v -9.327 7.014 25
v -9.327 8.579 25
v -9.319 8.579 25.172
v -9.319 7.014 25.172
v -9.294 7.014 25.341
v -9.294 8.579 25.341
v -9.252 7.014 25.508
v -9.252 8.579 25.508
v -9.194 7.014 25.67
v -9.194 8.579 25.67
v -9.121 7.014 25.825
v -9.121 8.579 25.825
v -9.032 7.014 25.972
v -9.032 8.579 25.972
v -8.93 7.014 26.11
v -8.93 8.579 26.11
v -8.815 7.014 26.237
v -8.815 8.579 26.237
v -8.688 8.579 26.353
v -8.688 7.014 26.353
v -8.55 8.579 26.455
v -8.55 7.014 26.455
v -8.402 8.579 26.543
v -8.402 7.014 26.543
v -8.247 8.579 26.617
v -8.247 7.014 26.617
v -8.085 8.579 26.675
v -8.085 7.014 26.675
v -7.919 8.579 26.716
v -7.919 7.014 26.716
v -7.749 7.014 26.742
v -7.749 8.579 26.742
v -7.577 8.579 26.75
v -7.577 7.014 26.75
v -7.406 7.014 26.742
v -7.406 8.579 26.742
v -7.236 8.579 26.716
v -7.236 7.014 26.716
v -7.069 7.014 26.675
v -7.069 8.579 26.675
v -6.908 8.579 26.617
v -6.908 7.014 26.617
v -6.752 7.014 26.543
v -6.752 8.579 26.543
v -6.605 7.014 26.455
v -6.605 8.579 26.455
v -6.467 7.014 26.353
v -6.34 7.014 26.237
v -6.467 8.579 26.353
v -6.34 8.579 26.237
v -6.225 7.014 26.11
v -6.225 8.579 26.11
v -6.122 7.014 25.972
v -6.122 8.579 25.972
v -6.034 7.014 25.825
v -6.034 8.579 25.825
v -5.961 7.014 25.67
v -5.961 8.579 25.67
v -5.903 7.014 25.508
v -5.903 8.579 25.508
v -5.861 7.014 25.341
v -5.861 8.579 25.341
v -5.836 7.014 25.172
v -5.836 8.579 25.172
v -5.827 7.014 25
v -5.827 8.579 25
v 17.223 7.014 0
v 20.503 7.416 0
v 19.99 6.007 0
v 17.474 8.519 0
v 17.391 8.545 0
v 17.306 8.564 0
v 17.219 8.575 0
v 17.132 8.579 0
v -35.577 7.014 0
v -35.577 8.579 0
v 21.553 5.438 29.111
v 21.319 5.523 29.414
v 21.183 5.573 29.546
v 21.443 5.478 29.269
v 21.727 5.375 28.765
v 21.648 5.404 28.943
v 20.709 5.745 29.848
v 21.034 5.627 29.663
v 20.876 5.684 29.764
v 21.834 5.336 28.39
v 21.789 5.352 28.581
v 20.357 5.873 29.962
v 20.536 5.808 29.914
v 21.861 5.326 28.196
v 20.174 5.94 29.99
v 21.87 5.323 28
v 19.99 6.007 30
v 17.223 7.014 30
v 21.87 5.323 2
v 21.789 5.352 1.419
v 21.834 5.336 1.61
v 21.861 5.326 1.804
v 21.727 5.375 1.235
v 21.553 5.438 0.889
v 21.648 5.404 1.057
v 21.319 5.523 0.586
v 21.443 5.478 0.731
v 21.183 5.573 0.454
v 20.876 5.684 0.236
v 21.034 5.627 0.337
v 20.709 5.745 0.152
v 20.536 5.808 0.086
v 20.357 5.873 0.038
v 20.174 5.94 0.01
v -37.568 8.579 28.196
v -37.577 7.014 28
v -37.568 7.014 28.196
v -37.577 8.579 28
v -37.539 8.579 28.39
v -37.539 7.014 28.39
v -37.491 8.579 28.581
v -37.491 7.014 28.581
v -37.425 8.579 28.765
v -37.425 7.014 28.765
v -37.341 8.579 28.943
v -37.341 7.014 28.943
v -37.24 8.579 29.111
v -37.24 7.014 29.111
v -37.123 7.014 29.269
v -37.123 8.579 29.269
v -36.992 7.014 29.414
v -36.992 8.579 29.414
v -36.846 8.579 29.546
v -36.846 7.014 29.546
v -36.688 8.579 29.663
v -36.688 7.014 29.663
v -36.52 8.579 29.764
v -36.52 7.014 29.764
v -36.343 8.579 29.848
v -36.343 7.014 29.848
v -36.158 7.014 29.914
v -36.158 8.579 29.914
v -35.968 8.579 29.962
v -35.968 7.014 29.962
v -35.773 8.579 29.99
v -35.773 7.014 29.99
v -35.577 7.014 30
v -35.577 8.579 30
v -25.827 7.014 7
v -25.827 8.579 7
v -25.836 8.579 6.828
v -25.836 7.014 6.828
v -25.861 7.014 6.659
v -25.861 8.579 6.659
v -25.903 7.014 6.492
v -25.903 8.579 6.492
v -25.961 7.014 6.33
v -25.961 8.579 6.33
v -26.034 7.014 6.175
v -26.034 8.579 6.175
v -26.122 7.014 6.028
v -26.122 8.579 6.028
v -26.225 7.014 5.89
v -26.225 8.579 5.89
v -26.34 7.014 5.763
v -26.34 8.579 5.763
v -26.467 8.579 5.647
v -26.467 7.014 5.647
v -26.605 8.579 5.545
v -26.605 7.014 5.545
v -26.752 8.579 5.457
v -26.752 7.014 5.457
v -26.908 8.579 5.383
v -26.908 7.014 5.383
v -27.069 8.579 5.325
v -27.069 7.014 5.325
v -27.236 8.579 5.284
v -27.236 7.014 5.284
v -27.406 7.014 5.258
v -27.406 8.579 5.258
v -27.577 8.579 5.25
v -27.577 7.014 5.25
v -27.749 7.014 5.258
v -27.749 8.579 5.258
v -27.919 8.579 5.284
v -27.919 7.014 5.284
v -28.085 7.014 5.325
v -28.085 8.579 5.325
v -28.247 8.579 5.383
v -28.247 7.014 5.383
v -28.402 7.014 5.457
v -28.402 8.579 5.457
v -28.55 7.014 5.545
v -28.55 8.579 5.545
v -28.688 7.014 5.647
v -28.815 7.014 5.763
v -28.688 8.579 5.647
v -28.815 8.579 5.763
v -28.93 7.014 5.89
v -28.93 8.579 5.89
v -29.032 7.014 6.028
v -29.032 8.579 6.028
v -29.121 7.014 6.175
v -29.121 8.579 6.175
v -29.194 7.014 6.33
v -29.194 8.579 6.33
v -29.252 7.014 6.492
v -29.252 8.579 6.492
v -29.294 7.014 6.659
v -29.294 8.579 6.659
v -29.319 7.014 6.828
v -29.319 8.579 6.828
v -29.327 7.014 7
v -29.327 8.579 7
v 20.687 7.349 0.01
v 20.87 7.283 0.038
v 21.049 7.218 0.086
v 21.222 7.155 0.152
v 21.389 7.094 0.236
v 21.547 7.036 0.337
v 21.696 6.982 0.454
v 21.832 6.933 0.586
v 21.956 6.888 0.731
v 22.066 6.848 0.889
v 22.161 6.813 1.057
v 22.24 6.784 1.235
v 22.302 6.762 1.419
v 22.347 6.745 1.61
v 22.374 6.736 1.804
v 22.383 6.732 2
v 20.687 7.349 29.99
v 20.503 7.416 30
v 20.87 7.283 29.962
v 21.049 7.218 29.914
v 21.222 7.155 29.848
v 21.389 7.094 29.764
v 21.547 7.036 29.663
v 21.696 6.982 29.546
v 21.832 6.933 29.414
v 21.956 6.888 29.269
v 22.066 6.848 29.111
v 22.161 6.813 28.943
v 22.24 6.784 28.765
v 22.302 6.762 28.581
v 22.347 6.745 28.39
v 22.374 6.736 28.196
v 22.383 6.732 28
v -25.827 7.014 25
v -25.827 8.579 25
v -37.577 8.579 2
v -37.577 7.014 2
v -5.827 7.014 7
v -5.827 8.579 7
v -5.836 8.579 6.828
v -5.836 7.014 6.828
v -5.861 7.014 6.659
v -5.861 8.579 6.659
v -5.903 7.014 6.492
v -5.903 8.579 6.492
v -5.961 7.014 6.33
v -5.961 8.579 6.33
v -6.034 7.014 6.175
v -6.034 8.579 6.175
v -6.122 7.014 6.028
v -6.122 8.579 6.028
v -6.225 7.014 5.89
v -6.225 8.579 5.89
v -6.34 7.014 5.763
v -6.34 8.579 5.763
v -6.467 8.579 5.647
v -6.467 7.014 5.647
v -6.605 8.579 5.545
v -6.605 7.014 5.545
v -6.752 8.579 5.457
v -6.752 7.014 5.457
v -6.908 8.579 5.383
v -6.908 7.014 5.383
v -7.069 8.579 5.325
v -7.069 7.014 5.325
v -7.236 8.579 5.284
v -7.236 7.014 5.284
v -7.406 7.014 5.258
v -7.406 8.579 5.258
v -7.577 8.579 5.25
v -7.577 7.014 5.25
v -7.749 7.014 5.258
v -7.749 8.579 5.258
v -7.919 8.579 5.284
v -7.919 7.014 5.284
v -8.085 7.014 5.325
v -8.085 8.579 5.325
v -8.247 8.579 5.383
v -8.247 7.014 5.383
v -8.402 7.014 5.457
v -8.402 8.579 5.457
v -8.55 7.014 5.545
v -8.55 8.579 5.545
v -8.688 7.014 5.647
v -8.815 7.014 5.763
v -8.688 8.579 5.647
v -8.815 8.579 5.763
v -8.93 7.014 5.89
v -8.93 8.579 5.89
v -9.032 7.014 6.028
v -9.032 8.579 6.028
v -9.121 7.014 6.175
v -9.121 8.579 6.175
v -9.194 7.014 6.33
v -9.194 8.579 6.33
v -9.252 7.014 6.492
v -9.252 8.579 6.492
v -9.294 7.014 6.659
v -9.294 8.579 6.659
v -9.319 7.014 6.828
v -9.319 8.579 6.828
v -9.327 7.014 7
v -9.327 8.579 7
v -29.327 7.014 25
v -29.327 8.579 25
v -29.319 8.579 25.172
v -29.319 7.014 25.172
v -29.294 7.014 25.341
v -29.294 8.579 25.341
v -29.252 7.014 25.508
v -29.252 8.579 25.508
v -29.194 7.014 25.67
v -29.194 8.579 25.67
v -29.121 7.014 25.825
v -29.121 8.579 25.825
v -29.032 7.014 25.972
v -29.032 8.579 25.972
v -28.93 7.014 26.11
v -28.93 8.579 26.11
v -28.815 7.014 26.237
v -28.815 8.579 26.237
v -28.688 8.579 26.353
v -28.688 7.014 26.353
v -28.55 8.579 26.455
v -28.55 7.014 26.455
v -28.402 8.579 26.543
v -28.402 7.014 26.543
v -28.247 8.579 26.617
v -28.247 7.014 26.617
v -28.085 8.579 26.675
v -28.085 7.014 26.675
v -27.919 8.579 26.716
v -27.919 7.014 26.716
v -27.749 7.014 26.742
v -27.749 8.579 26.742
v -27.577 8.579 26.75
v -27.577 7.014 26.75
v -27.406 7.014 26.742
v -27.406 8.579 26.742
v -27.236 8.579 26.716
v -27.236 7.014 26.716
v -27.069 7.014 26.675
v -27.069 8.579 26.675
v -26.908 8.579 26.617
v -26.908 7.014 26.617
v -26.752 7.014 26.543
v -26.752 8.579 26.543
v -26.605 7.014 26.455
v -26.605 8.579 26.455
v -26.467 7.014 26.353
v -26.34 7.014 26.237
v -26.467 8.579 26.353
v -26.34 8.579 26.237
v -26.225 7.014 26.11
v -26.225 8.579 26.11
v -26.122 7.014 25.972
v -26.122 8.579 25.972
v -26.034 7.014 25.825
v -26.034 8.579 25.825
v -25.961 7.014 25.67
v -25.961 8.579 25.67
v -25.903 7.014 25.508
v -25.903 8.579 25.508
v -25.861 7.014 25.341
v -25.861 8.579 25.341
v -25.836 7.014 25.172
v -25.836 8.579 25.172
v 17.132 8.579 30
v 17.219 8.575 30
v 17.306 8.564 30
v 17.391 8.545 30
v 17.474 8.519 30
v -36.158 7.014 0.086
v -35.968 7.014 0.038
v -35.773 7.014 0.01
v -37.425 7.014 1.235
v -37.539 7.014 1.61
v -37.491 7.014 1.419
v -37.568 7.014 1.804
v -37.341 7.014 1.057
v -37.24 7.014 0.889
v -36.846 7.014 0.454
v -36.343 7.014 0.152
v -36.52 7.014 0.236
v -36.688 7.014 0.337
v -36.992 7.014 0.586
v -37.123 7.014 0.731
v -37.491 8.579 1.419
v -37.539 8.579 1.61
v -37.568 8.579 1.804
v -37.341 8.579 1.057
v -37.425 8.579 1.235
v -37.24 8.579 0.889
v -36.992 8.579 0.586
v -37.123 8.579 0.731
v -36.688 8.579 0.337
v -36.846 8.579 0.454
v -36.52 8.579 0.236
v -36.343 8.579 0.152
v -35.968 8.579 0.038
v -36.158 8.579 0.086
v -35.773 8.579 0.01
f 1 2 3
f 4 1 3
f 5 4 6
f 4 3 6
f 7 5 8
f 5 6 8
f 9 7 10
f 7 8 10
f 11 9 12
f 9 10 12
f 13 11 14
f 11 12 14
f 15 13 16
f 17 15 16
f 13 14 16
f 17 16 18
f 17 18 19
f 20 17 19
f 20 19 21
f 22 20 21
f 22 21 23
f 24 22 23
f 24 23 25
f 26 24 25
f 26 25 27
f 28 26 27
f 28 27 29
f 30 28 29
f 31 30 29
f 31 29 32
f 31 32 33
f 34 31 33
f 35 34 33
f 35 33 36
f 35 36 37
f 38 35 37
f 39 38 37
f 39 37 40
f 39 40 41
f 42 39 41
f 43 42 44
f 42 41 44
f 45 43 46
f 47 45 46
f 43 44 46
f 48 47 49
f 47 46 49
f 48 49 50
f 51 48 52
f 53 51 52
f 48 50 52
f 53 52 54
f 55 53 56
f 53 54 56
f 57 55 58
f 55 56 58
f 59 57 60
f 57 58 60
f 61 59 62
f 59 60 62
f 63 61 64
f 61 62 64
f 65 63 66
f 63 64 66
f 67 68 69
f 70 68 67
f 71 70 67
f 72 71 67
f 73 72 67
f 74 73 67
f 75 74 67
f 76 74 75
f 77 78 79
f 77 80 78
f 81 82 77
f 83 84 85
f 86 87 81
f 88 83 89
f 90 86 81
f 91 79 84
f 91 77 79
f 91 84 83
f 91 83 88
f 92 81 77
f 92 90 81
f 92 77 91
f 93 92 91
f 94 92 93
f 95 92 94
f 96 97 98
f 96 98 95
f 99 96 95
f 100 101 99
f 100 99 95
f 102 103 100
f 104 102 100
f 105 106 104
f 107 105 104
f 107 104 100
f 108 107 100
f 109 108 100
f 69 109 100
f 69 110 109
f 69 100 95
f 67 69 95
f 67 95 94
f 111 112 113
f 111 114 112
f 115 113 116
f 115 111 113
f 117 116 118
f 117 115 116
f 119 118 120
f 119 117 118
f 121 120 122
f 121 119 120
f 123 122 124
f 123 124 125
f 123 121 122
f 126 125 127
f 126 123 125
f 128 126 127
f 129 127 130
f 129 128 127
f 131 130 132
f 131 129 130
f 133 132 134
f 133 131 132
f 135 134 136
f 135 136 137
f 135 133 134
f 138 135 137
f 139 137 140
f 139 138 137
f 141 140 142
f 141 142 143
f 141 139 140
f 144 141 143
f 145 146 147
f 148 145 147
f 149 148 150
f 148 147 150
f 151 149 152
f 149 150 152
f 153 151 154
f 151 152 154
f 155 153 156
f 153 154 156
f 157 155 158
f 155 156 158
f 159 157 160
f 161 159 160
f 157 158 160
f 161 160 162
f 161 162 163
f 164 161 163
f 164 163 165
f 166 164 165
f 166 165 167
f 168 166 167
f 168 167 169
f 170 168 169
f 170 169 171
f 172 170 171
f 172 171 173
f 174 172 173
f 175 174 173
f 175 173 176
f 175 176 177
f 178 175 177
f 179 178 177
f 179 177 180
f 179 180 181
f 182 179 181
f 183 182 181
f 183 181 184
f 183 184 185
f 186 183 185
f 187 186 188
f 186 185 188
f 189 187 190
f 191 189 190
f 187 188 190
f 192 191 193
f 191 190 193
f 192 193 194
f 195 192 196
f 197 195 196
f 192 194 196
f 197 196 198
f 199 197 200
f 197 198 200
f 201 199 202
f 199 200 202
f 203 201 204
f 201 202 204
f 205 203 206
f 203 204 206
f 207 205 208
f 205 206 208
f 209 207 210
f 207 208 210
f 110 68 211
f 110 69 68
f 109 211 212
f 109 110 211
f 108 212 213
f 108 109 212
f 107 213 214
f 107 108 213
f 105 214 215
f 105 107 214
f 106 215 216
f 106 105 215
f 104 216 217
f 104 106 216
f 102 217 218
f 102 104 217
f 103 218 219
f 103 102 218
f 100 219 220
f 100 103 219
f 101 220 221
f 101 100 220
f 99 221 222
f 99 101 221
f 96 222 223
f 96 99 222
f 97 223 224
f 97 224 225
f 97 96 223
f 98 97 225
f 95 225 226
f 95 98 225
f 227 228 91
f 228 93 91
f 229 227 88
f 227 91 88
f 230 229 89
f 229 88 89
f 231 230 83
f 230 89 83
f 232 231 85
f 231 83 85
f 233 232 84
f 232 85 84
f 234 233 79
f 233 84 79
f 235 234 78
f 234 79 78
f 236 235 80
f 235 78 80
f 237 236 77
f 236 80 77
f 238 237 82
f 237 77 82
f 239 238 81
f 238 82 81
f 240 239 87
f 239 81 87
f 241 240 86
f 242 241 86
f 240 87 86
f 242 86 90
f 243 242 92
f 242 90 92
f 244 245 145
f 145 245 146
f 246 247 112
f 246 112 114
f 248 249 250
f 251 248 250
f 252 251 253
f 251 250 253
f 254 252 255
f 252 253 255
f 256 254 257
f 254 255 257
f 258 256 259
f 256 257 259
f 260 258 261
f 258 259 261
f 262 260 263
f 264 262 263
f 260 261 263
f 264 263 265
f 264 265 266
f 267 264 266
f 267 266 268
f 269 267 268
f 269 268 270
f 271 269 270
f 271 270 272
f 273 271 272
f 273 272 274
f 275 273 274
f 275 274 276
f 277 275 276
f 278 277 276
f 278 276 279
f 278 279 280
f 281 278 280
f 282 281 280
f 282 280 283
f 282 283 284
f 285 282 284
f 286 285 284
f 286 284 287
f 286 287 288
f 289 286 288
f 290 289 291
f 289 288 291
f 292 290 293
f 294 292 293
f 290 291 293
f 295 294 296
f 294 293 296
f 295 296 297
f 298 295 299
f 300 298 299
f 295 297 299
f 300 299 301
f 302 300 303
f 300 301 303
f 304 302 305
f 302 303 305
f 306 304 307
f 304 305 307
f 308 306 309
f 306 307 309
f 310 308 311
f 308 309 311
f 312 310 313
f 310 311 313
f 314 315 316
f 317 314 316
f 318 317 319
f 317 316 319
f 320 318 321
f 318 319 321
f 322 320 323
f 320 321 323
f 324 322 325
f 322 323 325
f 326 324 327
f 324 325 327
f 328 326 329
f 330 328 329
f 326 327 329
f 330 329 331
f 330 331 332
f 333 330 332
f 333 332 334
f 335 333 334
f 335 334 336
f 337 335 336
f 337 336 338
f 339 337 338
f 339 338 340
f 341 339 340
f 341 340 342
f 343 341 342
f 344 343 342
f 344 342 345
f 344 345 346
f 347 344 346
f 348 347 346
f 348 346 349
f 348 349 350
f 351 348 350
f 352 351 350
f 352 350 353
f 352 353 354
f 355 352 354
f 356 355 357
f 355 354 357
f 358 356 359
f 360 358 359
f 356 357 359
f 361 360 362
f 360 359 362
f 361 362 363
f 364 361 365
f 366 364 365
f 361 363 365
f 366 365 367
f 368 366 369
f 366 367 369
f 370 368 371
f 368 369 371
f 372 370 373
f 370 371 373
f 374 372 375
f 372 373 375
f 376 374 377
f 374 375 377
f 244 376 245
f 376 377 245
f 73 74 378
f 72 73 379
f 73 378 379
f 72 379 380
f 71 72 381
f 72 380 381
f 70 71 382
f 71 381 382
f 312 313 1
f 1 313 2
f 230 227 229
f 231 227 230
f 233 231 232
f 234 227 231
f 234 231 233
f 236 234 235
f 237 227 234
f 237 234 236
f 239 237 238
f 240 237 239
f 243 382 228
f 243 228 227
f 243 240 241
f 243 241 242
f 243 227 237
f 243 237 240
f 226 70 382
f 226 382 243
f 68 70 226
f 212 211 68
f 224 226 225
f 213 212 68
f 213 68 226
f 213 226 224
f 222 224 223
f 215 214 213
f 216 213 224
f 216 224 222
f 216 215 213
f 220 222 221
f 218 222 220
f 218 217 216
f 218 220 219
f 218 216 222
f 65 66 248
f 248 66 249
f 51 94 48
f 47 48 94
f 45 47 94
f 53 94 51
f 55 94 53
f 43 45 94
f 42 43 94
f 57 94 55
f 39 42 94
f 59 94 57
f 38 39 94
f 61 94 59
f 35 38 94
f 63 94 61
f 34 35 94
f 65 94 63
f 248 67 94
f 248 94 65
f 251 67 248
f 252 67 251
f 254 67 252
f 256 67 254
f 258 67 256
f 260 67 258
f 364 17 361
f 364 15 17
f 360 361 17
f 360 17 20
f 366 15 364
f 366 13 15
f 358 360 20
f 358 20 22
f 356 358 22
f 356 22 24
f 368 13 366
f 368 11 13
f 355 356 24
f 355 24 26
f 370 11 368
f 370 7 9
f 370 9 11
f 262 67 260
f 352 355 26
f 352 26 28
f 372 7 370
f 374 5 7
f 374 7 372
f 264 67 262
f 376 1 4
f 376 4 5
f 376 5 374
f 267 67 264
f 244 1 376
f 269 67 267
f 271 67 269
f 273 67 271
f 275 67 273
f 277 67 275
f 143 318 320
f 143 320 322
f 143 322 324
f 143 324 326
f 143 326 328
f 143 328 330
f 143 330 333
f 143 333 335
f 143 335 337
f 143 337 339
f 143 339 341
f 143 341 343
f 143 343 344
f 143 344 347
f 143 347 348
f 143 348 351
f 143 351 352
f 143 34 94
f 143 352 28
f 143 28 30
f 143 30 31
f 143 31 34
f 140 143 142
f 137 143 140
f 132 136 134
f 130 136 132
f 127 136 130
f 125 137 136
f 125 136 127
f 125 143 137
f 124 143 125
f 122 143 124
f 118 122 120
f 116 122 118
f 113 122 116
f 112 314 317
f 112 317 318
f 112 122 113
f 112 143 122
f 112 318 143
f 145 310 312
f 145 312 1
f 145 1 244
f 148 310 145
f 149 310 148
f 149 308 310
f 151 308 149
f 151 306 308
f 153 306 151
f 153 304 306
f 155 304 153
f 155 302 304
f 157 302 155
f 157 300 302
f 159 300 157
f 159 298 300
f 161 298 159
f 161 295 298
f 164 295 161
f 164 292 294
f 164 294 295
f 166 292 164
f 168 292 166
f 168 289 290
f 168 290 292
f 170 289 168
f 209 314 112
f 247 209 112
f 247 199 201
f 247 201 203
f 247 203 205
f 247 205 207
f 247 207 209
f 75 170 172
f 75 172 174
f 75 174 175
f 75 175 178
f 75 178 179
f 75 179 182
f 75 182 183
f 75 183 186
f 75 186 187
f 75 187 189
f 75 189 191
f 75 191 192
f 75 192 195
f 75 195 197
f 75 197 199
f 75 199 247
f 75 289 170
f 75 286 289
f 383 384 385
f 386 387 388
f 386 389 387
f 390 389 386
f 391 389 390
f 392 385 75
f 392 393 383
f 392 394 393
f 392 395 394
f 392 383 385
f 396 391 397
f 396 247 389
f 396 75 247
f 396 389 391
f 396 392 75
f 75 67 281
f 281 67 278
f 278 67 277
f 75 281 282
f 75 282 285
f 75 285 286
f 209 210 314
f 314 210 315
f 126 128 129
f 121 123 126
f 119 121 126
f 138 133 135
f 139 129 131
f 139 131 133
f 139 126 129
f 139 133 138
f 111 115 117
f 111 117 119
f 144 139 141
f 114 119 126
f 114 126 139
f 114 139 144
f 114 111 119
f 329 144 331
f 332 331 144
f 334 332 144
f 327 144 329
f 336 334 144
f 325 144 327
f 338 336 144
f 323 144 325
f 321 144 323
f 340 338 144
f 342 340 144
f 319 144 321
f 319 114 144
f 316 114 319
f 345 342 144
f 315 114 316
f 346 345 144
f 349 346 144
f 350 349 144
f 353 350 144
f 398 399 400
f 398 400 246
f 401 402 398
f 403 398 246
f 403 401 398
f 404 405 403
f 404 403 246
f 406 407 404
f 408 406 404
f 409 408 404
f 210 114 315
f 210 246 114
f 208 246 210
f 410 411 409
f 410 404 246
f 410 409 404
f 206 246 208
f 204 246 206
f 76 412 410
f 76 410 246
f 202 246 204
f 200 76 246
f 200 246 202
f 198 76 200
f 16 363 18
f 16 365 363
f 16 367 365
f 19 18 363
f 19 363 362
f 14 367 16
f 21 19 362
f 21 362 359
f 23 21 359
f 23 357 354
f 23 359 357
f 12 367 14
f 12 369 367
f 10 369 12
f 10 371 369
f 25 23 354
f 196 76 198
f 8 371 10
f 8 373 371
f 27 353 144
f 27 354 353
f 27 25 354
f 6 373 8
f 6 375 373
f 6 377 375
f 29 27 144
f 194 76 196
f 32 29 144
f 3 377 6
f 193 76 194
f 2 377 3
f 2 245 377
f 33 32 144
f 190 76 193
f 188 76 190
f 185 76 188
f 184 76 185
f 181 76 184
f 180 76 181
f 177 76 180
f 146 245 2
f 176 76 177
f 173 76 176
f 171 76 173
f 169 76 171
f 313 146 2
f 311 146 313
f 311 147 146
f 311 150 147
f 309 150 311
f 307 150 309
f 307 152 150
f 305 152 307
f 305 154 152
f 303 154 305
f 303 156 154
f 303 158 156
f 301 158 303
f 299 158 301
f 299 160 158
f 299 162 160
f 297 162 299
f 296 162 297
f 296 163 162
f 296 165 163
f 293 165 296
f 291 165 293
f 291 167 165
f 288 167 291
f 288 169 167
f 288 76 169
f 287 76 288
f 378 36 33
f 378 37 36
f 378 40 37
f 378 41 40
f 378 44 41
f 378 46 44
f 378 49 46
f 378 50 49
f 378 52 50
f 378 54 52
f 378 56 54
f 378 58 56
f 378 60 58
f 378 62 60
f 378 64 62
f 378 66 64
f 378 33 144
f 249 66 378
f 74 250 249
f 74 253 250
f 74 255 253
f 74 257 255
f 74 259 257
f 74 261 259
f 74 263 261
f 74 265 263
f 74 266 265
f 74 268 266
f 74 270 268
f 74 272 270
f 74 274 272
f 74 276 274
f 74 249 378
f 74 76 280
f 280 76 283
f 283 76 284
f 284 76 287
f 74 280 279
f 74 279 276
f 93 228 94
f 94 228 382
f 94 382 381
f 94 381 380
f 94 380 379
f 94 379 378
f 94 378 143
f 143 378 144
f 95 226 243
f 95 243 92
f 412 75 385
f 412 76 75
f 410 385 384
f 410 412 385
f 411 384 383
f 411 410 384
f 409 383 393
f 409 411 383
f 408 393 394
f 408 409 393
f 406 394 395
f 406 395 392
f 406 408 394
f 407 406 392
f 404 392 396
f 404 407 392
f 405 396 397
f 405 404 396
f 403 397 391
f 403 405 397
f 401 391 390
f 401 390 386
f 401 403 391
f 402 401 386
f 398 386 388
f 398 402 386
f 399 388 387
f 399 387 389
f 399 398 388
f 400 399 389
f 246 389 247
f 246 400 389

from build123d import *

# Parameters (mm, degrees)
BOSS_EXTRUDE1_DEPTH = 30
FILLET1_R           = 1
FILLET2_R           = 2
CUT_EXTRUDE1_DEPTH  = 4.256447705


with BuildPart() as part:
    # Sketch1 → Boss-Extrude1 (new body)
    with BuildSketch(Plane.XY):
        Polygon((-37.577345781, 8.579229267), (17.308314067, 8.579229267), (22.382654219, 6.732320493), (21.869624004, 5.322781562), (17.222654219, 7.014140243), (-37.577345781, 7.014140243), align=None)
    extrude(amount=BOSS_EXTRUDE1_DEPTH)

    # Fillet1
    fillet1_edges = [part.edges().sort_by_distance(p)[0] for p in [
        (17.308314067, 8.579229267, 15),
    ]]
    fillet(fillet1_edges, radius=FILLET1_R)

    # Fillet2
    fillet2_edges = [part.edges().sort_by_distance(p)[0] for p in [
        (22.126139112, 6.027551028, 30),
        (-37.577345781, 7.796684755, 30),
        (22.126139112, 6.027551028, 0),
        (-37.577345781, 7.796684755, 0),
    ]]
    fillet(fillet2_edges, radius=FILLET2_R)

    # Sketch3 → Cut-Extrude1 (cut, through all)
    with BuildSketch(Plane(origin=(0, 8.579229267, 0), x_dir=(1, 0, 0), z_dir=(0, 1, 0))):
        with BuildLine():
            Line((-25.827345781, -25), (-25.827345781, -7))
            ThreePointArc((-25.827345781, -7), (-27.577345781, -5.25), (-29.327345781, -7))
            Line((-29.327345781, -7), (-29.327345781, -25))
            ThreePointArc((-29.327345781, -25), (-27.577345781, -26.75), (-25.827345781, -25))
        make_face()
        with BuildLine():
            Line((-5.827345781, -25), (-5.827345781, -7))
            ThreePointArc((-5.827345781, -7), (-7.577345781, -5.25), (-9.327345781, -7))
            Line((-9.327345781, -7), (-9.327345781, -25))
            ThreePointArc((-9.327345781, -25), (-7.577345781, -26.75), (-5.827345781, -25))
        make_face()
    extrude(amount=-CUT_EXTRUDE1_DEPTH, mode=Mode.SUBTRACT)


solid = part.part
